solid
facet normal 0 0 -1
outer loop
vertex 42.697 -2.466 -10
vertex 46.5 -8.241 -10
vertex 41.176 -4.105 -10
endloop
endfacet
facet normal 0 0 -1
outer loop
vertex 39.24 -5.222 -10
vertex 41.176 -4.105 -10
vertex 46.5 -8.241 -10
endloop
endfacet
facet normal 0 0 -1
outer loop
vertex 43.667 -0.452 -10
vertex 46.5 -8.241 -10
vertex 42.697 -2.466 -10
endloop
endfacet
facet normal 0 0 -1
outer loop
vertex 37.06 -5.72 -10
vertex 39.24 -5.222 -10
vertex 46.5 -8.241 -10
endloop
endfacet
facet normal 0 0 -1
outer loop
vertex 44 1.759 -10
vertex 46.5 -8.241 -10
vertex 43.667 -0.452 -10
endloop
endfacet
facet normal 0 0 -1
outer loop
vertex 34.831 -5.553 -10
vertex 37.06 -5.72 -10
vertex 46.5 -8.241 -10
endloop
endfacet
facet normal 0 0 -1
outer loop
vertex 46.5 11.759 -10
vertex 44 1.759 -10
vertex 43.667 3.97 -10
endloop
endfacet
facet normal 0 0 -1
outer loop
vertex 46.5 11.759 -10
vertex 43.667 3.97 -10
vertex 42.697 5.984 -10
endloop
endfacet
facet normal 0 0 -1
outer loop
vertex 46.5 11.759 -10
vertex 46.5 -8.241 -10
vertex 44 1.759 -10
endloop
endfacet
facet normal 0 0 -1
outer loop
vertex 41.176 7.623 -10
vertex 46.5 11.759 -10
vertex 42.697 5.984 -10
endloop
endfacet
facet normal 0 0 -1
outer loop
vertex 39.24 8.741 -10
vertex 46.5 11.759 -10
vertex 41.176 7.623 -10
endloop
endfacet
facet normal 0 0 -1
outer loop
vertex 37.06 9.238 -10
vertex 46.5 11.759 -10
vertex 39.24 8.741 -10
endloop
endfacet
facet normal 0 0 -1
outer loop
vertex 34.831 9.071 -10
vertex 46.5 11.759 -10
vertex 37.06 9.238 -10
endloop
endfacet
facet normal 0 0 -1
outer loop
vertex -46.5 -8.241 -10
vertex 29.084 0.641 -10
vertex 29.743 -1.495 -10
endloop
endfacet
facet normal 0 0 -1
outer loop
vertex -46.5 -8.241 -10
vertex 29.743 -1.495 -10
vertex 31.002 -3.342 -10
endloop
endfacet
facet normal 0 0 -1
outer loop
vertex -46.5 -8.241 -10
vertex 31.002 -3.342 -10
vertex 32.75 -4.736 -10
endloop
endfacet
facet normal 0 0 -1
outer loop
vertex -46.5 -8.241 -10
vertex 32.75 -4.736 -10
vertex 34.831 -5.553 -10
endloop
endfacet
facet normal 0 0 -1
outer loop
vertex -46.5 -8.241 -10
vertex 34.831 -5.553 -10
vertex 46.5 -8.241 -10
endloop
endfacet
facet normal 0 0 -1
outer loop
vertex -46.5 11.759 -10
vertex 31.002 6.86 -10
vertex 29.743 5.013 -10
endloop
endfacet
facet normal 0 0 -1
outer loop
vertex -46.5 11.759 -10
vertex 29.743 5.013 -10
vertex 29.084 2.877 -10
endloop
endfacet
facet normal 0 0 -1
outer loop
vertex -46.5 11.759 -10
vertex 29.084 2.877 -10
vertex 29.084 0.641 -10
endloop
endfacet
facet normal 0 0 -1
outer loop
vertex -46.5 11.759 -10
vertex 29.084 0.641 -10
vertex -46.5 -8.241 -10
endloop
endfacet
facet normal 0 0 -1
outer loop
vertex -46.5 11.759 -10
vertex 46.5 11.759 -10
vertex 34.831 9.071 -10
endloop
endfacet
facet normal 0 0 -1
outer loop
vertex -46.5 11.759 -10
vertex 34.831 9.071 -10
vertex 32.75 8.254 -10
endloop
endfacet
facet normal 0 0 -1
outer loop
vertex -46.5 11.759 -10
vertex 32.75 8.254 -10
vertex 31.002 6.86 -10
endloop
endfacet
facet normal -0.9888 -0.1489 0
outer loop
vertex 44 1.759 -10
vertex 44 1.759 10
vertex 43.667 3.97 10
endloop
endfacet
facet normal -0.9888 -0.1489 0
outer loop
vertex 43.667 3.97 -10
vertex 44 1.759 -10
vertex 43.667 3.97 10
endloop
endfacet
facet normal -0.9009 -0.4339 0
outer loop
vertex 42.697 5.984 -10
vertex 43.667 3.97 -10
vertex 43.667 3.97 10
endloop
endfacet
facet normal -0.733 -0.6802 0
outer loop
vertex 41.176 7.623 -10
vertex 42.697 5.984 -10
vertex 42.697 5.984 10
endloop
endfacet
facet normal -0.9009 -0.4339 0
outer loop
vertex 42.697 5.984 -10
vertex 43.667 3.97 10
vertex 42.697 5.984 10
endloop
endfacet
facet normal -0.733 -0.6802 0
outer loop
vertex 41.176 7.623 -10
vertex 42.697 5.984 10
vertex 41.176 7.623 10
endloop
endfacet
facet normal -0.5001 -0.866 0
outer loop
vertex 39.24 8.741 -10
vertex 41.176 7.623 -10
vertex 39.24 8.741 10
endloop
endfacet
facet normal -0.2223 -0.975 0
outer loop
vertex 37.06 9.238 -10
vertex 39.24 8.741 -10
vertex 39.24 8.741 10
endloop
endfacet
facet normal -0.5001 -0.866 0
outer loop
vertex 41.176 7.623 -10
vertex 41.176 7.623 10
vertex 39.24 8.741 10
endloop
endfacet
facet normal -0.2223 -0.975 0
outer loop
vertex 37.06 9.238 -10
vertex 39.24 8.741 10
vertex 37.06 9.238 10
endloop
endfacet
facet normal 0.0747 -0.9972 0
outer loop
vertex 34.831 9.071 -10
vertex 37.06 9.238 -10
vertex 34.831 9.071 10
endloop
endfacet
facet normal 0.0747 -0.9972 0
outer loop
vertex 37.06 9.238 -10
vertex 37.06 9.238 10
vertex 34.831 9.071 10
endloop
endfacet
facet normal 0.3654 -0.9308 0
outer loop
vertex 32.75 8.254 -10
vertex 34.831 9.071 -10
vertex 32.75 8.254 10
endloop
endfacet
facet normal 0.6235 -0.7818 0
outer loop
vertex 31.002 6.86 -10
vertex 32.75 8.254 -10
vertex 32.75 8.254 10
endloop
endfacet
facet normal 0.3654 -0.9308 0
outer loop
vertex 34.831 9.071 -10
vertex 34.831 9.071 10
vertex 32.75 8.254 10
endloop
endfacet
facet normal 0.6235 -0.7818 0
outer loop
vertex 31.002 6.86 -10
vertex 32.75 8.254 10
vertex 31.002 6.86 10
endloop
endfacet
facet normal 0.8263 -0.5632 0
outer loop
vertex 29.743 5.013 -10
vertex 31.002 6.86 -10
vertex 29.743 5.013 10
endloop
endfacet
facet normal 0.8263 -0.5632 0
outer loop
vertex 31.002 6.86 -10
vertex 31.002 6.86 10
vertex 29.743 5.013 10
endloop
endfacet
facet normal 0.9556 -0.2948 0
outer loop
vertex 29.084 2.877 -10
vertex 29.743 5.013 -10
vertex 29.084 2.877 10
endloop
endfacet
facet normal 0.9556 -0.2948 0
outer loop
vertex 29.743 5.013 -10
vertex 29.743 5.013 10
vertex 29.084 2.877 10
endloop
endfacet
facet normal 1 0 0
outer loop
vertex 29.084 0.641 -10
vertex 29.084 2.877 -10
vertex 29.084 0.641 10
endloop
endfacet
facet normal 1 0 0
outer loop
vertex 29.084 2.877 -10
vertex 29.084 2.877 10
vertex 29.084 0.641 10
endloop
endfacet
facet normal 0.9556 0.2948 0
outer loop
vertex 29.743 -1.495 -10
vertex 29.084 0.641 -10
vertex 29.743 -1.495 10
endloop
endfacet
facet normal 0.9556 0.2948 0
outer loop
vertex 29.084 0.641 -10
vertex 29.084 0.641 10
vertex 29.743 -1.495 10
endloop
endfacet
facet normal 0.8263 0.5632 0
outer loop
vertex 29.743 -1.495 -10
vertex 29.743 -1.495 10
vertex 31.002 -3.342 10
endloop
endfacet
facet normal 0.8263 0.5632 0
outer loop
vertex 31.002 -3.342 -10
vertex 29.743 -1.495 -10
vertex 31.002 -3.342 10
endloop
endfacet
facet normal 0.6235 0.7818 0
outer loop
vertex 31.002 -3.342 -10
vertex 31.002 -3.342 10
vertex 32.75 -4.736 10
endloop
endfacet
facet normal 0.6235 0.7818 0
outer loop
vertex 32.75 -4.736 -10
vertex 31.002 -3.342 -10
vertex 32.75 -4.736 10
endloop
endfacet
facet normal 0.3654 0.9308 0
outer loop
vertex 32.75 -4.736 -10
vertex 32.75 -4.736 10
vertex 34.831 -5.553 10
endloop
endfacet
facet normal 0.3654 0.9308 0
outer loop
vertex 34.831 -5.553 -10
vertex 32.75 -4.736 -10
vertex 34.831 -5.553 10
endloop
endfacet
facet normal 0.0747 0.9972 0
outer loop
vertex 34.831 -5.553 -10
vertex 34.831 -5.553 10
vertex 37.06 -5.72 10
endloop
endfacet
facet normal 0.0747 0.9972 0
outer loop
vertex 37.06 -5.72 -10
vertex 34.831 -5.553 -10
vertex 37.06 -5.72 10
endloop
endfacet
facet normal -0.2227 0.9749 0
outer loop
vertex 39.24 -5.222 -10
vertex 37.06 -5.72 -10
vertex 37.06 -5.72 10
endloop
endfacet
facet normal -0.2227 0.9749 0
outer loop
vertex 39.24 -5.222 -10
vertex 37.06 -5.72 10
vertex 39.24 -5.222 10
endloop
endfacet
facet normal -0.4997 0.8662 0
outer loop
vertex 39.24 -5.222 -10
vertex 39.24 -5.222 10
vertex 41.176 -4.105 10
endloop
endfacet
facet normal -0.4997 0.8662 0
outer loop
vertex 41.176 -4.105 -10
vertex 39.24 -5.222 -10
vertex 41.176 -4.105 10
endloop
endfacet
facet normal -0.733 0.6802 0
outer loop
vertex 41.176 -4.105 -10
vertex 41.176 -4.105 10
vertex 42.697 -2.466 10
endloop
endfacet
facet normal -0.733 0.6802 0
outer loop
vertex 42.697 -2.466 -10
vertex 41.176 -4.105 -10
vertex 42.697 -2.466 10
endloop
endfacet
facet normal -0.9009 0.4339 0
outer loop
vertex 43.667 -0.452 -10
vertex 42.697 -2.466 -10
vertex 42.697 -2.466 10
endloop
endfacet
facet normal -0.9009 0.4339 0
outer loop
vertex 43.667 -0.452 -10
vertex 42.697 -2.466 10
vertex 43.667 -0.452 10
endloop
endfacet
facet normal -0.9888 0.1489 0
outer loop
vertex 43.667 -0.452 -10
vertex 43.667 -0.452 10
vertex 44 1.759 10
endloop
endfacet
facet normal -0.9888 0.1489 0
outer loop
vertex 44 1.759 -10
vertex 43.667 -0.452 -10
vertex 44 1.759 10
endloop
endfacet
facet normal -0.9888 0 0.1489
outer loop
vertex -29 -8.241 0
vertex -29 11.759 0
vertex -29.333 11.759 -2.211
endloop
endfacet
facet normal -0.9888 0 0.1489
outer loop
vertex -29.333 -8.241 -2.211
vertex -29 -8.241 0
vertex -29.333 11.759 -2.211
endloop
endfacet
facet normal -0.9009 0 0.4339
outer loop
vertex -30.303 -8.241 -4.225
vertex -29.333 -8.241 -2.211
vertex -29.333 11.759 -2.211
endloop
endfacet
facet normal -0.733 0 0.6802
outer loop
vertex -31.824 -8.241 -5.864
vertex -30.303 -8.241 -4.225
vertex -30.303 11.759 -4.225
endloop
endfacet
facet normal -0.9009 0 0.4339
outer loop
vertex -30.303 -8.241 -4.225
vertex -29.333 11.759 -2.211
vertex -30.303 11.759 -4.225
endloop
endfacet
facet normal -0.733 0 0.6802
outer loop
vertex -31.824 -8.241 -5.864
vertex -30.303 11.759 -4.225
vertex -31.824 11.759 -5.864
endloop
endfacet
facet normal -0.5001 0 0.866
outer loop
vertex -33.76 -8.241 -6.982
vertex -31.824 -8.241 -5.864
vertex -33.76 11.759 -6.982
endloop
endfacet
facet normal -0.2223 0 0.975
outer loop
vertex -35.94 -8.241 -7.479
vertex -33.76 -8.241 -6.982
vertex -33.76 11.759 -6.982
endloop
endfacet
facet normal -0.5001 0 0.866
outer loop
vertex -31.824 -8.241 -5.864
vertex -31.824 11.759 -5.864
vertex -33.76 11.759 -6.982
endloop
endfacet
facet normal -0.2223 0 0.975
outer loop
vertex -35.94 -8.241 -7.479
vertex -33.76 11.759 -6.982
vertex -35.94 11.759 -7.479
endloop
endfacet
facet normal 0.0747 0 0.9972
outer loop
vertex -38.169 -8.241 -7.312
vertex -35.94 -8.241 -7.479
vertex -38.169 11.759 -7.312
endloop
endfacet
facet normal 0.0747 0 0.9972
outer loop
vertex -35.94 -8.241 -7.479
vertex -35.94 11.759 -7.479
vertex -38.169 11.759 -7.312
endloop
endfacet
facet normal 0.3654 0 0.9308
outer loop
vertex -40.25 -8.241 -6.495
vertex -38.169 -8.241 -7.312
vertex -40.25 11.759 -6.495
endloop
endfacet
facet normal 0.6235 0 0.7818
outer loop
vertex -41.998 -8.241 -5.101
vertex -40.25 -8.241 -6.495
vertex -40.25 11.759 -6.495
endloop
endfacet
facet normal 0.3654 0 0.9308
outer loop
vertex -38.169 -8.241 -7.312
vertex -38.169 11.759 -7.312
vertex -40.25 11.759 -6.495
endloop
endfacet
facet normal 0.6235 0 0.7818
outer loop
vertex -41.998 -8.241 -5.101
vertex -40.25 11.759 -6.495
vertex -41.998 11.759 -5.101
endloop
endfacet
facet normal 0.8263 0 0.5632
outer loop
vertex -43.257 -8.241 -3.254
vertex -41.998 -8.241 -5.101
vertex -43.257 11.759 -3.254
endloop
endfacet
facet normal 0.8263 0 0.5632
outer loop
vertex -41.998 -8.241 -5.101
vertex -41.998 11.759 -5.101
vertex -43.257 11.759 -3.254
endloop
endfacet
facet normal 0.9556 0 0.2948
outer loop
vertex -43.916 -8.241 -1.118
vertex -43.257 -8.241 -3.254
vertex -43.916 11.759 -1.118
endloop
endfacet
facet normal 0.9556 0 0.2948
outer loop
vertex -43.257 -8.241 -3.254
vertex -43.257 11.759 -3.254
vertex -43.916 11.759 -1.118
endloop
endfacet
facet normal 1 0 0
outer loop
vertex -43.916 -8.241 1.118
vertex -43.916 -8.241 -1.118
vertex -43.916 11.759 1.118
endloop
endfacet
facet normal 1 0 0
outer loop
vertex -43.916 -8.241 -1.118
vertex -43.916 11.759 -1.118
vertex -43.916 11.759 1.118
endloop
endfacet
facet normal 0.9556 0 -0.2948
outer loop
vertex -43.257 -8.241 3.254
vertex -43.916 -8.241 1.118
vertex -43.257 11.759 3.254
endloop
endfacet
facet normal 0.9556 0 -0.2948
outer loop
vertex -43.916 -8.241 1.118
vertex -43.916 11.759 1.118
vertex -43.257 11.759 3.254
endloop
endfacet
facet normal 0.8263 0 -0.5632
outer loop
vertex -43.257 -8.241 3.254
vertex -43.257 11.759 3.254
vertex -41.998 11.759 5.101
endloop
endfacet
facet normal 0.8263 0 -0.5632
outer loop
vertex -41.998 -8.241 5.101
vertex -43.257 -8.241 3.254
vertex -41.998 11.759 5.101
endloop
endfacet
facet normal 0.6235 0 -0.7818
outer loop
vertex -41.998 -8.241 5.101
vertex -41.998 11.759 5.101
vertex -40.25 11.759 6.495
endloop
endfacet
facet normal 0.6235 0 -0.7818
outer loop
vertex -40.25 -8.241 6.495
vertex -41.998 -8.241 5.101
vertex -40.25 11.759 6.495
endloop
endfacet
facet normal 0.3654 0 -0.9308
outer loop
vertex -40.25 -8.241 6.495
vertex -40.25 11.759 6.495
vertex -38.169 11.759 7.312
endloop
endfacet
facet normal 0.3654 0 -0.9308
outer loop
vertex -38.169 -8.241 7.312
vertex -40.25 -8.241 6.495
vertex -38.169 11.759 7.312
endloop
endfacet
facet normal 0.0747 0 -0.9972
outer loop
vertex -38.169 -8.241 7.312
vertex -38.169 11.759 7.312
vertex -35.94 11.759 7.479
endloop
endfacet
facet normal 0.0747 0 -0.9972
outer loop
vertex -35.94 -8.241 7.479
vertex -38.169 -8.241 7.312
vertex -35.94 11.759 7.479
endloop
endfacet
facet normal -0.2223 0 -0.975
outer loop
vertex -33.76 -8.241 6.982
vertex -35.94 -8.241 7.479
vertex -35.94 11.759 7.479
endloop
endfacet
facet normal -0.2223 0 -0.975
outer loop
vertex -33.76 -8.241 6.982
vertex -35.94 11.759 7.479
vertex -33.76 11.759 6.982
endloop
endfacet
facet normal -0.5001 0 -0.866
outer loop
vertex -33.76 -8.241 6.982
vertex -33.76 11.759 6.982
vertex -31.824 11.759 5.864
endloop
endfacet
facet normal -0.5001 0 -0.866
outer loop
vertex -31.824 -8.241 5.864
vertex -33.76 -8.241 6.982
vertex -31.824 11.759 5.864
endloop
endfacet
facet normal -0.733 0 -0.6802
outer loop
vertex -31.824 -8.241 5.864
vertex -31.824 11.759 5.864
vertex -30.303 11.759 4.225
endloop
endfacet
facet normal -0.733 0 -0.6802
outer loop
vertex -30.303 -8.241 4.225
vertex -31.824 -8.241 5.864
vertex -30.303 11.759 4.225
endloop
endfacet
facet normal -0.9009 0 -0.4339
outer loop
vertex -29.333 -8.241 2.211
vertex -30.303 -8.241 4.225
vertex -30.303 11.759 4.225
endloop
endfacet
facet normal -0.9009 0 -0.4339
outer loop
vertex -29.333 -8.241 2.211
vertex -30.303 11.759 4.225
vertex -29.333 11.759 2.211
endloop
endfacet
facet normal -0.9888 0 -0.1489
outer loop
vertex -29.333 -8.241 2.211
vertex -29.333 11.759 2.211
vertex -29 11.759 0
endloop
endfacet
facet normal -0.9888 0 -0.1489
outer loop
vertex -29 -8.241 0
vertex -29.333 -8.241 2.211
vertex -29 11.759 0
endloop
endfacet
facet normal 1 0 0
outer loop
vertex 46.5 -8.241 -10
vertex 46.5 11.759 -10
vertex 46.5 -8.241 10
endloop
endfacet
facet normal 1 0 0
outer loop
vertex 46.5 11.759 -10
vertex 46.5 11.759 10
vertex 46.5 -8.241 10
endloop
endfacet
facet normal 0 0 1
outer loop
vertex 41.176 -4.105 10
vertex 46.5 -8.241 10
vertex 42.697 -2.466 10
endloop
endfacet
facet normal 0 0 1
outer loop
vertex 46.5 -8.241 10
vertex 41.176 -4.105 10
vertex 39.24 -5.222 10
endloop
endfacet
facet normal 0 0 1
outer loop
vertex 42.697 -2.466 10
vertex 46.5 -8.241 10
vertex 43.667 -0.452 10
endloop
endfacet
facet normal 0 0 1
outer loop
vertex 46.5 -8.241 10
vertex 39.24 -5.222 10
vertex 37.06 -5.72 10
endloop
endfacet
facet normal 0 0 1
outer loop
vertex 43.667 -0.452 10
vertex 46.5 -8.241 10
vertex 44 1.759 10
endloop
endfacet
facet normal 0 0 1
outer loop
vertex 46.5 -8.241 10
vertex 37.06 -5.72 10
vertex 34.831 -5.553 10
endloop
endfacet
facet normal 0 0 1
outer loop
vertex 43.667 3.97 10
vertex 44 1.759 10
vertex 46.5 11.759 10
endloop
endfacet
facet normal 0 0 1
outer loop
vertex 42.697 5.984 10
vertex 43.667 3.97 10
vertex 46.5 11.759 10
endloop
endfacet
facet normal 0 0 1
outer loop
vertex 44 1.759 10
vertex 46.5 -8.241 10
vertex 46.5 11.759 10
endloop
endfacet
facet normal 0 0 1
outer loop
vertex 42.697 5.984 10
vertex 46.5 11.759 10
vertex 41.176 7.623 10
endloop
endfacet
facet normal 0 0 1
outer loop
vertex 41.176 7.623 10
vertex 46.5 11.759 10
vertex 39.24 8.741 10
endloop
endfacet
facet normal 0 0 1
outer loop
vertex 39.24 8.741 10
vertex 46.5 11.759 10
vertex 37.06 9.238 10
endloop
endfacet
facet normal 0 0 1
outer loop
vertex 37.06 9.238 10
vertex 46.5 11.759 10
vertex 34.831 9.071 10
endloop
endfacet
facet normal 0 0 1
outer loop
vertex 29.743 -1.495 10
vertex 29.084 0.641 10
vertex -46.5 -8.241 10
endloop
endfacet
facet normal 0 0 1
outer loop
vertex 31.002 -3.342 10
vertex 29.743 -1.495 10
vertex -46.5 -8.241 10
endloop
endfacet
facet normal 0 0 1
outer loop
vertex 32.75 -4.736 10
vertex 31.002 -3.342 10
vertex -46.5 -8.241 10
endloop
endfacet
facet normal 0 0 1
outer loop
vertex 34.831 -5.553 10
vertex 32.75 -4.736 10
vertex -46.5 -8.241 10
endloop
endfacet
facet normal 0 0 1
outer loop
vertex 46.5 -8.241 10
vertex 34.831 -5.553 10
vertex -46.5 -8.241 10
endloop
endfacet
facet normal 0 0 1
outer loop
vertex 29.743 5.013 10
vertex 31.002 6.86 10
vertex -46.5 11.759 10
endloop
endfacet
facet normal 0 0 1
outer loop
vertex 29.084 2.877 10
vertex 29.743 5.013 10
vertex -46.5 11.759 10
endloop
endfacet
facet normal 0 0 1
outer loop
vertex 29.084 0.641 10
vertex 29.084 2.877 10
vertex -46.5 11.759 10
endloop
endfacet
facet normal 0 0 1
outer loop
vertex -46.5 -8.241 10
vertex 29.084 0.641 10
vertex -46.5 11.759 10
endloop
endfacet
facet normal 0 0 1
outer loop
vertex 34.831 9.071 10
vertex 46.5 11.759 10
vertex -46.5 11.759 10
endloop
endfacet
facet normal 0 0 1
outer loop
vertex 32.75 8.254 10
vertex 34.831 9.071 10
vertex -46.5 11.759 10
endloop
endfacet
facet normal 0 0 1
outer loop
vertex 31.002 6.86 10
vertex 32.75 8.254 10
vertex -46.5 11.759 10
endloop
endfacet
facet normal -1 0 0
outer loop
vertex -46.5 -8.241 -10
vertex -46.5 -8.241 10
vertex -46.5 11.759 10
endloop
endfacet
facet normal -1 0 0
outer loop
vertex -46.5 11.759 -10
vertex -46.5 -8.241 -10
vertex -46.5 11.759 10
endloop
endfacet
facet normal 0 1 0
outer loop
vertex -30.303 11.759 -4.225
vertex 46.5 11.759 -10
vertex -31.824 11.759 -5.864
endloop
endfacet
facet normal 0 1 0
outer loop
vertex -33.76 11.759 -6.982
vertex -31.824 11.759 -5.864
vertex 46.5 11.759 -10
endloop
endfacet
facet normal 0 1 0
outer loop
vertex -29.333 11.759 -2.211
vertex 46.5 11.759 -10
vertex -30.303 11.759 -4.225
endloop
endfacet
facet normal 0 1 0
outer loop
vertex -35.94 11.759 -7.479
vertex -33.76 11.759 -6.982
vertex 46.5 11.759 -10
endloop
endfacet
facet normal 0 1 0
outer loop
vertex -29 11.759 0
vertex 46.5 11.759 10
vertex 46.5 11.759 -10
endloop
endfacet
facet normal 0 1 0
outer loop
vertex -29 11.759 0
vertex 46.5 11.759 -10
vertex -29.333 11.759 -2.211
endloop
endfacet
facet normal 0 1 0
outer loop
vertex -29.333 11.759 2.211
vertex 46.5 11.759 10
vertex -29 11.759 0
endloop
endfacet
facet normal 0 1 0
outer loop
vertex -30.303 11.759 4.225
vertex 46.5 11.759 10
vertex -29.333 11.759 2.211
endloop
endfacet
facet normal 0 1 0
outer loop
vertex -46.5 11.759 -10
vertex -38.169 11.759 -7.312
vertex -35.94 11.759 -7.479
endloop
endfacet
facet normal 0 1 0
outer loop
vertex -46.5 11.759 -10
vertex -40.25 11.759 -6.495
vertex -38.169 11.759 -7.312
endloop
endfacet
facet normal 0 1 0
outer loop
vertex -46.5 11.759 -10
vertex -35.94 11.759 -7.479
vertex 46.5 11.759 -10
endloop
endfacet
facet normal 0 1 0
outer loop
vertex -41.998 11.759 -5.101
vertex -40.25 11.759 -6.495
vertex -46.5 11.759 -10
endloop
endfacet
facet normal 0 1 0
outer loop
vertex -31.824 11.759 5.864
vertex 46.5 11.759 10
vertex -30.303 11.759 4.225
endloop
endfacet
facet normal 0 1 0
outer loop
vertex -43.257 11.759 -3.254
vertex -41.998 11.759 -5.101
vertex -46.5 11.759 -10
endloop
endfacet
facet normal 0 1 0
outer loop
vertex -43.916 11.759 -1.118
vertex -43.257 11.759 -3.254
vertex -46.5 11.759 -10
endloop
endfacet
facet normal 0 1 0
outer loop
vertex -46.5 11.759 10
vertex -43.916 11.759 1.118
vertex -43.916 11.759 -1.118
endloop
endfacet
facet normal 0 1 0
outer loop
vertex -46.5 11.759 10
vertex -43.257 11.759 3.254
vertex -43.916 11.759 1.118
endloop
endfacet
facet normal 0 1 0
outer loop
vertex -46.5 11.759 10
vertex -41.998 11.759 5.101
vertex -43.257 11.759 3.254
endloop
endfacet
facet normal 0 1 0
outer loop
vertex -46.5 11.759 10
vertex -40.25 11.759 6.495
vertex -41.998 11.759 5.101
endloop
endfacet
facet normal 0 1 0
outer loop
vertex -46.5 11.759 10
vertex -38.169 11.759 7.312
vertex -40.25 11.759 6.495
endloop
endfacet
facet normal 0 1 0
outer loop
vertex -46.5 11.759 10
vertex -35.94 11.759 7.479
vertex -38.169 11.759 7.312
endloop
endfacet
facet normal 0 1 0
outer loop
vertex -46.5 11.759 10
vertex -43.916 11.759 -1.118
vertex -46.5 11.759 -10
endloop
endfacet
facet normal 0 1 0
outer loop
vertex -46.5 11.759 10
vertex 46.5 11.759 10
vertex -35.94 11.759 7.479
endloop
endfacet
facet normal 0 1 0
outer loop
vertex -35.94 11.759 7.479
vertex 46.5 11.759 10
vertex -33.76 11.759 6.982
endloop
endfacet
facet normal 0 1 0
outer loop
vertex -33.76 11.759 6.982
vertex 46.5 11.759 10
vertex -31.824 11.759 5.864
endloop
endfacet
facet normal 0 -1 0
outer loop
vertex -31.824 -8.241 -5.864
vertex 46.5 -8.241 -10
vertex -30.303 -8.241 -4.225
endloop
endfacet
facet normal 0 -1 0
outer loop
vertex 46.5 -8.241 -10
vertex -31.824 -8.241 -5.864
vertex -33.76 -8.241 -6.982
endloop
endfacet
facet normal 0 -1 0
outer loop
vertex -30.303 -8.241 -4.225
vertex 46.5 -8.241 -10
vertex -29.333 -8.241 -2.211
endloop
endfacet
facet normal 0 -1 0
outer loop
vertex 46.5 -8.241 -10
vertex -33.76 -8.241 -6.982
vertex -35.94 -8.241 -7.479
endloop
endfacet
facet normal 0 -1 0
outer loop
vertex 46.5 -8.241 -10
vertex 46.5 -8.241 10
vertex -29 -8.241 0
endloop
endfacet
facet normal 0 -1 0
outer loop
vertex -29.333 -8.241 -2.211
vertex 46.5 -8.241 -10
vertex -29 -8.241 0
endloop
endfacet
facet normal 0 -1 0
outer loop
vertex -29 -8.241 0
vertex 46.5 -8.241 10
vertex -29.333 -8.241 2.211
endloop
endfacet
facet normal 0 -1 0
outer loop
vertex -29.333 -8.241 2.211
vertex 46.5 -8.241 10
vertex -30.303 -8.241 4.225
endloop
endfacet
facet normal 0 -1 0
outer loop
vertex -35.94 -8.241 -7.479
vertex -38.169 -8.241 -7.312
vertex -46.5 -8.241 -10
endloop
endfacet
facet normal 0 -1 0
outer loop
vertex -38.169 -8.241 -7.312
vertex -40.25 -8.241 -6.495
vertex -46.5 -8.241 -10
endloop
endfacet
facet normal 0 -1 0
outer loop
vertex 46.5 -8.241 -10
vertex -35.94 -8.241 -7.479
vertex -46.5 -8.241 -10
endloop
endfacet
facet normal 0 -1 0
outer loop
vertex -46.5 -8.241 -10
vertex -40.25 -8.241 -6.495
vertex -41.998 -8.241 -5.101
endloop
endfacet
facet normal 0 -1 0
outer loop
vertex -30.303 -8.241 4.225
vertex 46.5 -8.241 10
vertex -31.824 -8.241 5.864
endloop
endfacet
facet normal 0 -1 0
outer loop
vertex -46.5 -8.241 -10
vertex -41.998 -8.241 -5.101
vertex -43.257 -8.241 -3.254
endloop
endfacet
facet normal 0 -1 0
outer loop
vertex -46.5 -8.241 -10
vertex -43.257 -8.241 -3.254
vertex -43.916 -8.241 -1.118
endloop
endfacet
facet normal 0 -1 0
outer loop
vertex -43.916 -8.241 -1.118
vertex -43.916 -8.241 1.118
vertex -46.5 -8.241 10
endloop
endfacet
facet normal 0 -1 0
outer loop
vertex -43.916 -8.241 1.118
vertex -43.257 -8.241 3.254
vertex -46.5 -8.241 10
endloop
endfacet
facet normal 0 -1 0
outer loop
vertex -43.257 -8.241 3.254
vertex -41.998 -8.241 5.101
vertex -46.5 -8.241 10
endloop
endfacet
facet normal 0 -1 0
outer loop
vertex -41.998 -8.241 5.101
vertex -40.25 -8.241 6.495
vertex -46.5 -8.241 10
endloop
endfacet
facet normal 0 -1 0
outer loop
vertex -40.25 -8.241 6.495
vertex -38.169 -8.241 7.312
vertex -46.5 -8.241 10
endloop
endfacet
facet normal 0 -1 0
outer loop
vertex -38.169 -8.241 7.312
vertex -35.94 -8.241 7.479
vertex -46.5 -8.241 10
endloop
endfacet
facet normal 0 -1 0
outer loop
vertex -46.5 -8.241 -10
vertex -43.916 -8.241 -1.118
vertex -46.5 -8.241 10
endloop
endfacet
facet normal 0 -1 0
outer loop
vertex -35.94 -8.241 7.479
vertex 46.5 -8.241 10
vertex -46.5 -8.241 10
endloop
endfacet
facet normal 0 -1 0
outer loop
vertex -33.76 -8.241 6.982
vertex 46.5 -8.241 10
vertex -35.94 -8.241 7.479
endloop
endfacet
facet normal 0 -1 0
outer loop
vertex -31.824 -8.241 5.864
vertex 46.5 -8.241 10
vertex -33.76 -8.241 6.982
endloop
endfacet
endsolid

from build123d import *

# Parameters (mm, degrees)
SALIENTE_EXTRUIR1_DEPTH    = 10
CROQUIS2_R                 = 7.5
CORTAR_EXTRUIR1_DEPTH      = 1
CORTAR_EXTRUIR1_DEPTH_BACK = 21
CROQUIS3_R                 = 7.5
CORTAR_EXTRUIR2_DEPTH      = 1
CORTAR_EXTRUIR2_DEPTH_BACK = 21


with BuildPart() as part:
    # Croquis1 → Saliente-Extruir1 (new body, symmetric)
    with BuildSketch(Plane.XY):
        Polygon((0, 11.759082218), (46.5, 11.759082218), (46.5, -8.240917782), (-46.5, -8.240917782), (-46.5, 11.759082218), align=None)
    extrude(amount=SALIENTE_EXTRUIR1_DEPTH, both=True)

    # Croquis2 → Cortar-Extruir1 (cut, two sides)
    with BuildSketch(Plane.XY.offset(10)) as cortar_extruir1_sk:
        with Locations((36.5, 1.759082218)):
            Circle(CROQUIS2_R)
    extrude(amount=CORTAR_EXTRUIR1_DEPTH, mode=Mode.SUBTRACT)
    extrude(cortar_extruir1_sk.sketch, amount=-CORTAR_EXTRUIR1_DEPTH_BACK, mode=Mode.SUBTRACT)

    # Croquis3 → Cortar-Extruir2 (cut, two sides)
    with BuildSketch(Plane(origin=(0, 11.759082218, 0), x_dir=(1, 0, 0), z_dir=(0, 1, 0))) as cortar_extruir2_sk:
        with Locations((-36.5, 0)):
            Circle(CROQUIS3_R)
    extrude(amount=CORTAR_EXTRUIR2_DEPTH, mode=Mode.SUBTRACT)
    extrude(cortar_extruir2_sk.sketch, amount=-CORTAR_EXTRUIR2_DEPTH_BACK, mode=Mode.SUBTRACT)


solid = part.part
